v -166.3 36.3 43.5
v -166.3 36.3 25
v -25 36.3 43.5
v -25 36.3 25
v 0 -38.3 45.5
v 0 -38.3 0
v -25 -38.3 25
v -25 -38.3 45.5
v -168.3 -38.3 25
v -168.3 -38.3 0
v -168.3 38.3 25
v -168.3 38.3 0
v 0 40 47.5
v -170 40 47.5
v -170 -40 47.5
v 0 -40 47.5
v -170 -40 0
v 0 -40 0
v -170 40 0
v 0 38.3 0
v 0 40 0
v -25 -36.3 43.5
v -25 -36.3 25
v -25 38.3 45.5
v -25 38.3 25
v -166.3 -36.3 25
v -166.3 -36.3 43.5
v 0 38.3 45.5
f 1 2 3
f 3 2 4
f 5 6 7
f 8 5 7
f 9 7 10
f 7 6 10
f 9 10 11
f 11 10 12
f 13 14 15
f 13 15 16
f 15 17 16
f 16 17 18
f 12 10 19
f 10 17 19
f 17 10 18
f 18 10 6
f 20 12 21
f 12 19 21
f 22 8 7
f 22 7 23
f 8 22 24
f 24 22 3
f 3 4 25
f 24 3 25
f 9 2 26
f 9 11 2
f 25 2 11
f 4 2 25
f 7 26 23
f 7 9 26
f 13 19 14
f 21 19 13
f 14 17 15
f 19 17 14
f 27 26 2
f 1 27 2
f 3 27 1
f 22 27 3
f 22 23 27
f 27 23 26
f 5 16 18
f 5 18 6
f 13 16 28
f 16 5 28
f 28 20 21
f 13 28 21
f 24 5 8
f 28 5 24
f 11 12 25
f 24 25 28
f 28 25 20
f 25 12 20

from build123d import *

# Parameters (mm, degrees)
F1_DEPTH  = 43.5
F2_W      = 170
F2_H      = 80
F3_DEPTH  = 4
F5_DEPTH  = 25
F6_W      = 25
F6_H      = 2
F7_DEPTH  = 43.5
F9_DEPTH  = 25
F10_W     = 25
F10_H     = 0.3
F11_DEPTH = 18.5
F13_DEPTH = 18.5
F14_W     = 25
F14_H     = 0.3
F15_DEPTH = 18.5
F16_W     = 76.6
F16_H     = 2
F17_DEPTH = 25


with BuildPart() as f1:
    # F0 (on Top) → F1 (new body)
    with BuildSketch(Plane.XY):
        Polygon((-166, 0), (-166, 36), (0, 36), (0, 40), (-170, 40), (-170, -40), (0, -40), (0, -36), (-166, -36), align=None)
    extrude(amount=F1_DEPTH)

    # F2 (on face) → F3 (join)
    with BuildSketch(Plane.XY.offset(43.5)):
        with Locations((-85, 0)):
            Rectangle(F2_W, F2_H)
    extrude(amount=F3_DEPTH)

    # F4 (on face) → F5 (cut)
    with BuildSketch(Plane.XY):
        Polygon((0, -36), (-166, -36), (-166, 0), (-166, 36), (0, 36), (0, 38), (-168, 38), (-168, -38), (0, -38), align=None)
    extrude(amount=F5_DEPTH, mode=Mode.SUBTRACT)

    # F6 (on face) → F7 (cut)
    with BuildSketch(Plane.XY):
        with Locations((-12.5, -37)):
            Rectangle(F6_W, F6_H)
        with Locations((-12.5, 37)):
            Rectangle(F6_W, F6_H)
    extrude(amount=F7_DEPTH, mode=Mode.SUBTRACT)

    # F8 (on face) → F9 (cut)
    with BuildSketch(Plane(origin=(0, 0, 0), x_dir=(1, 0, 0), z_dir=(0, 0, -1))):
        Polygon((-168, -38), (-168, 38), (0, 38), (0, 38.3), (-168.3, 38.3), (-168.3, -38.3), (0, -38.3), (0, -38), align=None)
    extrude(amount=-F9_DEPTH, mode=Mode.SUBTRACT)

    # F10 (on face) → F11 (cut)
    with BuildSketch(Plane(origin=(0, 0, 25), x_dir=(1, 0, 0), z_dir=(0, 0, -1))):
        with Locations((-12.5, 38.15)):
            Rectangle(F10_W, F10_H)
    extrude(amount=-F11_DEPTH, mode=Mode.SUBTRACT)

    # F12 (on face) → F13 (cut)
    with BuildSketch(Plane(origin=(0, 0, 25), x_dir=(1, 0, 0), z_dir=(0, 0, -1))):
        Polygon((-166, -36), (-166, 36), (-25, 36), (-25, 36.3), (-166.3, 36.3), (-166.3, -36.3), (-25, -36.3), (-25, -36), align=None)
    extrude(amount=-F13_DEPTH, mode=Mode.SUBTRACT)

    # F14 (on face) → F15 (cut)
    with BuildSketch(Plane(origin=(0, 0, 25), x_dir=(1, 0, 0), z_dir=(0, 0, -1))):
        with Locations((-12.5, -38.15)):
            Rectangle(F14_W, F14_H)
    extrude(amount=-F15_DEPTH, mode=Mode.SUBTRACT)

    # F16 (on face) → F17 (cut)
    with BuildSketch(Plane.YZ):
        with Locations((0, 44.5)):
            Rectangle(F16_W, F16_H)
    extrude(amount=-F17_DEPTH, mode=Mode.SUBTRACT)


solid = f1.part
